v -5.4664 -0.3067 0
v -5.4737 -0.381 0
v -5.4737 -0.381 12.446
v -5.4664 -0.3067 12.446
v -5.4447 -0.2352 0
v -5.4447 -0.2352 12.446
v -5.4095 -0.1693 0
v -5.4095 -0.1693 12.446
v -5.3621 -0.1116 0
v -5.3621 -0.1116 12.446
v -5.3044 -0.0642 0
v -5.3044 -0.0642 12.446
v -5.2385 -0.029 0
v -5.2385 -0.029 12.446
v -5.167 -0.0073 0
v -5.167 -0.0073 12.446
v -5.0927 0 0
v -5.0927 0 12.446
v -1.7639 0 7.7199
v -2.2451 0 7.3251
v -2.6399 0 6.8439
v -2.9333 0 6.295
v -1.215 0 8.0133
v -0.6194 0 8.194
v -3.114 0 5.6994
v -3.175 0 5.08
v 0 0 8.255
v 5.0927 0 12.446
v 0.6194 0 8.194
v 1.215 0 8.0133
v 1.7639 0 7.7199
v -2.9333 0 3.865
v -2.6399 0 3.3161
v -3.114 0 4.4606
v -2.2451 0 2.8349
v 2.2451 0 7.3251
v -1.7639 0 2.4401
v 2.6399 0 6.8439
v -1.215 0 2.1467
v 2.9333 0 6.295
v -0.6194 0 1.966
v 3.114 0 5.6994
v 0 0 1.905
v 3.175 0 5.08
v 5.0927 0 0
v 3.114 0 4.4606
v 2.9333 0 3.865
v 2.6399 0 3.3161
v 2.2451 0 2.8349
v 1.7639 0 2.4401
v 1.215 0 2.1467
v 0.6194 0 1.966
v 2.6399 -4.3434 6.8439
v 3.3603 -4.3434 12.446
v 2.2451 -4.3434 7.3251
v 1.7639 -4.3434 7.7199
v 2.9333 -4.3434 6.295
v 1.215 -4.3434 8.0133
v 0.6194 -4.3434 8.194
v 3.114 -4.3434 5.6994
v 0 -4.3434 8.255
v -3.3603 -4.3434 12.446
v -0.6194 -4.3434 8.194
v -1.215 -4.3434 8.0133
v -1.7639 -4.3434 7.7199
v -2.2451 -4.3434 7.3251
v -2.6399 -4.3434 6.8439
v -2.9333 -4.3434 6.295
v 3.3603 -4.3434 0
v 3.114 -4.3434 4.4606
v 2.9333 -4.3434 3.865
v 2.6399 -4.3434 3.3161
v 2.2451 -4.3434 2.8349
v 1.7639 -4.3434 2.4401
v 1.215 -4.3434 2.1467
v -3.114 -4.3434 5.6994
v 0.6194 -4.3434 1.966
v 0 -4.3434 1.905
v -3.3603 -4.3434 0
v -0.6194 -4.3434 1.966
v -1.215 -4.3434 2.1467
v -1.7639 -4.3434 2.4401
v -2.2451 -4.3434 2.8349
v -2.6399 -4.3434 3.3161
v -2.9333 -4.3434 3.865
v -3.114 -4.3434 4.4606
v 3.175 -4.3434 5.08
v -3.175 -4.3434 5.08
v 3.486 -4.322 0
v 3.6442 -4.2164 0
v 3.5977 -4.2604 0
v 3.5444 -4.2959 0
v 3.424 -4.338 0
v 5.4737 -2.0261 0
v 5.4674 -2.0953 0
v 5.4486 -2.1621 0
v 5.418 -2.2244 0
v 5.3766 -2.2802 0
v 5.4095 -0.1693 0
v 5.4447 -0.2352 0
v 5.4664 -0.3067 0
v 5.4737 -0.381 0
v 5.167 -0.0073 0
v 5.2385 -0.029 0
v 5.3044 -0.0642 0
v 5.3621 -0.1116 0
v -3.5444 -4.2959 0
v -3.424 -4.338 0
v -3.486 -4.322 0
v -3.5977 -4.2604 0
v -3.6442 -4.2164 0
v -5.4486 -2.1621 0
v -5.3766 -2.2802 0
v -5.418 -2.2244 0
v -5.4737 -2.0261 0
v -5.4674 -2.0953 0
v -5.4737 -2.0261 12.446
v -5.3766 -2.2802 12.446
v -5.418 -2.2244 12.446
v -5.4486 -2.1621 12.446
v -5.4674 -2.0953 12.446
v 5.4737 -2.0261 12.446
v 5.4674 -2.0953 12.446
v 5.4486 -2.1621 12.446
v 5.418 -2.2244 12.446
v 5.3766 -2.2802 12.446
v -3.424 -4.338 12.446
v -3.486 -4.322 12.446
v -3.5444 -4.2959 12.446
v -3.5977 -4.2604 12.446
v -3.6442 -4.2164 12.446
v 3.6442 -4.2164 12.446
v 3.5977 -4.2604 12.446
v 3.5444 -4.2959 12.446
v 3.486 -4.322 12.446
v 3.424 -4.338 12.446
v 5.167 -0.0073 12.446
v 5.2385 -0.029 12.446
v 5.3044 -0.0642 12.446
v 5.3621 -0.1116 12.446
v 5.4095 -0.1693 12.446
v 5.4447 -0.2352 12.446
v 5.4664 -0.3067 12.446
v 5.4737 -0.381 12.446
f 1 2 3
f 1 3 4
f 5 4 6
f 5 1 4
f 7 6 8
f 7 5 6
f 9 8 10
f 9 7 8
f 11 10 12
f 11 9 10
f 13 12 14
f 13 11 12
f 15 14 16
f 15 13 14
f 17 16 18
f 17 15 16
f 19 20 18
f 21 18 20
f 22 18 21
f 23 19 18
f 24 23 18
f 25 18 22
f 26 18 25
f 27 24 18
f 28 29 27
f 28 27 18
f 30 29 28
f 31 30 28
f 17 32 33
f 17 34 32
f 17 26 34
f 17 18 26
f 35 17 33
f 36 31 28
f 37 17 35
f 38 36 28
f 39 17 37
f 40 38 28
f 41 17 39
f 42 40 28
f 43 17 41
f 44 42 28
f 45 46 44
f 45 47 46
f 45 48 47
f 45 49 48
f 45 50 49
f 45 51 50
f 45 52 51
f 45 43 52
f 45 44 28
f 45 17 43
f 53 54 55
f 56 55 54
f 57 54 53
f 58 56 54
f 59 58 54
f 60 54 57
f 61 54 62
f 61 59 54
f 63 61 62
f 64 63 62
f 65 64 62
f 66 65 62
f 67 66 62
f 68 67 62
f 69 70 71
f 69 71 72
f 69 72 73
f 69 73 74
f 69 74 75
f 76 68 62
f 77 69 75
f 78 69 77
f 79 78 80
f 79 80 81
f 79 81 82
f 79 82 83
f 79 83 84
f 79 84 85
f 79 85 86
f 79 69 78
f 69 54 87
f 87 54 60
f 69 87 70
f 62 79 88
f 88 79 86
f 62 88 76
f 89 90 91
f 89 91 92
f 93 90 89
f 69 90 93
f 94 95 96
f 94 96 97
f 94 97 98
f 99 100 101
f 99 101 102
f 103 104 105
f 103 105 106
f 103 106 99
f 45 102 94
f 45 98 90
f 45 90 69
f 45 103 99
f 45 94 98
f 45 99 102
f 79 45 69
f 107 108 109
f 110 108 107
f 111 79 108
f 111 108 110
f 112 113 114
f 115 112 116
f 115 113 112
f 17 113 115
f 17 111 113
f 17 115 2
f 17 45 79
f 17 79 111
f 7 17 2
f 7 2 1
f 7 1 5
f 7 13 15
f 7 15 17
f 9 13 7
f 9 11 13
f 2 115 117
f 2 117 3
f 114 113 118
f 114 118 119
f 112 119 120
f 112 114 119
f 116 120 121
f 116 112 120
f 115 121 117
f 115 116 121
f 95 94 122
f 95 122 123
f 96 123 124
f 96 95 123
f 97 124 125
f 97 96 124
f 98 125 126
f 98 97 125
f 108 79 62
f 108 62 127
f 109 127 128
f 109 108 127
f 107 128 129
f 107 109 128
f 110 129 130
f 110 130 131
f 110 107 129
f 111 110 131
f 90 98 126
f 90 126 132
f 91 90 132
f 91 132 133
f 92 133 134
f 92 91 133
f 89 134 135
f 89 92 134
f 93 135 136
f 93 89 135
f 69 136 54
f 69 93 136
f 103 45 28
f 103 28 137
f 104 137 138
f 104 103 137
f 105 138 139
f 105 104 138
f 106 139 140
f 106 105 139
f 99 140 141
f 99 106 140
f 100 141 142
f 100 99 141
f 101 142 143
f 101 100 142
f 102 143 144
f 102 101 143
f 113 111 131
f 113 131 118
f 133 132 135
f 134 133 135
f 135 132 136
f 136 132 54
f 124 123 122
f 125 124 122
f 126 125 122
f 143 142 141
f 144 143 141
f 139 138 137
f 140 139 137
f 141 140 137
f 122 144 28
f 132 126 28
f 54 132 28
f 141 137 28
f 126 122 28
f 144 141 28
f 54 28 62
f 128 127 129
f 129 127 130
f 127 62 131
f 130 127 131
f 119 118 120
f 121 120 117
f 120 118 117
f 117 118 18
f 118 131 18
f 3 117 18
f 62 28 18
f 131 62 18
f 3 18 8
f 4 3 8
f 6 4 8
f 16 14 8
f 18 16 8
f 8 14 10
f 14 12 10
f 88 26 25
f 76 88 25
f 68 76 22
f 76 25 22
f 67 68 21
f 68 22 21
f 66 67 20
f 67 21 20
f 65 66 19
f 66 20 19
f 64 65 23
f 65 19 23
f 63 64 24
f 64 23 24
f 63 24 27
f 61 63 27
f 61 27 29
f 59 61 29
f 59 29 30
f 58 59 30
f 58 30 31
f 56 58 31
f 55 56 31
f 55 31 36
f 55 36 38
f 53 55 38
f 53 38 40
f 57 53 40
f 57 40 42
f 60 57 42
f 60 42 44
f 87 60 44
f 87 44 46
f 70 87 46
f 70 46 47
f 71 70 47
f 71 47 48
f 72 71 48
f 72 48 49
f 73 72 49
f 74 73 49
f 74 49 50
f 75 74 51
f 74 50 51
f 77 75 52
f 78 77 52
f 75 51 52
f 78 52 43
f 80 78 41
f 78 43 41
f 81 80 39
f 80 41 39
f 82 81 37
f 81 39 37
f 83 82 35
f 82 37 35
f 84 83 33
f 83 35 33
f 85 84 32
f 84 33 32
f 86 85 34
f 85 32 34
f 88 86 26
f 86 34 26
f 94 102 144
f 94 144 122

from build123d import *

# Parameters (mm, degrees)
EXTRUDE1_DEPTH     = 12.446
SKETCH2_R          = 3.175
CUT_EXTRUDE1_DEPTH = 12.446


with BuildPart() as part:
    # Sketch1 → Extrude1 (new body)
    with BuildSketch(Plane.XY):
        with BuildLine():
            Line((-5.0927, 0), (5.0927, 0))
            ThreePointArc((5.0927, 0), (5.362107684, -0.111592316), (5.4737, -0.381))
            Line((5.4737, -0.381), (5.4737, -2.026133402))
            ThreePointArc((5.4737, -2.026133402), (5.448607976, -2.162113227), (5.37663694, -2.280182243))
            Line((5.37663694, -2.280182243), (3.644187879, -4.216448841))
            ThreePointArc((3.644187879, -4.216448841), (3.515763625, -4.3102172), (3.360250938, -4.3434))
            Line((3.360250938, -4.3434), (-3.360250938, -4.3434))
            ThreePointArc((-3.360250938, -4.3434), (-3.515763625, -4.3102172), (-3.644187879, -4.216448841))
            Line((-3.644187879, -4.216448841), (-5.37663694, -2.280182243))
            ThreePointArc((-5.37663694, -2.280182243), (-5.448607976, -2.162113227), (-5.4737, -2.026133402))
            Line((-5.4737, -2.026133402), (-5.4737, -0.381))
            ThreePointArc((-5.4737, -0.381), (-5.362107684, -0.111592316), (-5.0927, 0))
        make_face()
    extrude(amount=EXTRUDE1_DEPTH)

    # Sketch2 → Cut-Extrude1 (cut)
    with BuildSketch(Plane(origin=(0, 0, 0), x_dir=(-1, 0, 0), z_dir=(0, 1, 0))):
        with Locations((0, 5.08)):
            Circle(SKETCH2_R)
    extrude(amount=-CUT_EXTRUDE1_DEPTH, mode=Mode.SUBTRACT)


solid = part.part
